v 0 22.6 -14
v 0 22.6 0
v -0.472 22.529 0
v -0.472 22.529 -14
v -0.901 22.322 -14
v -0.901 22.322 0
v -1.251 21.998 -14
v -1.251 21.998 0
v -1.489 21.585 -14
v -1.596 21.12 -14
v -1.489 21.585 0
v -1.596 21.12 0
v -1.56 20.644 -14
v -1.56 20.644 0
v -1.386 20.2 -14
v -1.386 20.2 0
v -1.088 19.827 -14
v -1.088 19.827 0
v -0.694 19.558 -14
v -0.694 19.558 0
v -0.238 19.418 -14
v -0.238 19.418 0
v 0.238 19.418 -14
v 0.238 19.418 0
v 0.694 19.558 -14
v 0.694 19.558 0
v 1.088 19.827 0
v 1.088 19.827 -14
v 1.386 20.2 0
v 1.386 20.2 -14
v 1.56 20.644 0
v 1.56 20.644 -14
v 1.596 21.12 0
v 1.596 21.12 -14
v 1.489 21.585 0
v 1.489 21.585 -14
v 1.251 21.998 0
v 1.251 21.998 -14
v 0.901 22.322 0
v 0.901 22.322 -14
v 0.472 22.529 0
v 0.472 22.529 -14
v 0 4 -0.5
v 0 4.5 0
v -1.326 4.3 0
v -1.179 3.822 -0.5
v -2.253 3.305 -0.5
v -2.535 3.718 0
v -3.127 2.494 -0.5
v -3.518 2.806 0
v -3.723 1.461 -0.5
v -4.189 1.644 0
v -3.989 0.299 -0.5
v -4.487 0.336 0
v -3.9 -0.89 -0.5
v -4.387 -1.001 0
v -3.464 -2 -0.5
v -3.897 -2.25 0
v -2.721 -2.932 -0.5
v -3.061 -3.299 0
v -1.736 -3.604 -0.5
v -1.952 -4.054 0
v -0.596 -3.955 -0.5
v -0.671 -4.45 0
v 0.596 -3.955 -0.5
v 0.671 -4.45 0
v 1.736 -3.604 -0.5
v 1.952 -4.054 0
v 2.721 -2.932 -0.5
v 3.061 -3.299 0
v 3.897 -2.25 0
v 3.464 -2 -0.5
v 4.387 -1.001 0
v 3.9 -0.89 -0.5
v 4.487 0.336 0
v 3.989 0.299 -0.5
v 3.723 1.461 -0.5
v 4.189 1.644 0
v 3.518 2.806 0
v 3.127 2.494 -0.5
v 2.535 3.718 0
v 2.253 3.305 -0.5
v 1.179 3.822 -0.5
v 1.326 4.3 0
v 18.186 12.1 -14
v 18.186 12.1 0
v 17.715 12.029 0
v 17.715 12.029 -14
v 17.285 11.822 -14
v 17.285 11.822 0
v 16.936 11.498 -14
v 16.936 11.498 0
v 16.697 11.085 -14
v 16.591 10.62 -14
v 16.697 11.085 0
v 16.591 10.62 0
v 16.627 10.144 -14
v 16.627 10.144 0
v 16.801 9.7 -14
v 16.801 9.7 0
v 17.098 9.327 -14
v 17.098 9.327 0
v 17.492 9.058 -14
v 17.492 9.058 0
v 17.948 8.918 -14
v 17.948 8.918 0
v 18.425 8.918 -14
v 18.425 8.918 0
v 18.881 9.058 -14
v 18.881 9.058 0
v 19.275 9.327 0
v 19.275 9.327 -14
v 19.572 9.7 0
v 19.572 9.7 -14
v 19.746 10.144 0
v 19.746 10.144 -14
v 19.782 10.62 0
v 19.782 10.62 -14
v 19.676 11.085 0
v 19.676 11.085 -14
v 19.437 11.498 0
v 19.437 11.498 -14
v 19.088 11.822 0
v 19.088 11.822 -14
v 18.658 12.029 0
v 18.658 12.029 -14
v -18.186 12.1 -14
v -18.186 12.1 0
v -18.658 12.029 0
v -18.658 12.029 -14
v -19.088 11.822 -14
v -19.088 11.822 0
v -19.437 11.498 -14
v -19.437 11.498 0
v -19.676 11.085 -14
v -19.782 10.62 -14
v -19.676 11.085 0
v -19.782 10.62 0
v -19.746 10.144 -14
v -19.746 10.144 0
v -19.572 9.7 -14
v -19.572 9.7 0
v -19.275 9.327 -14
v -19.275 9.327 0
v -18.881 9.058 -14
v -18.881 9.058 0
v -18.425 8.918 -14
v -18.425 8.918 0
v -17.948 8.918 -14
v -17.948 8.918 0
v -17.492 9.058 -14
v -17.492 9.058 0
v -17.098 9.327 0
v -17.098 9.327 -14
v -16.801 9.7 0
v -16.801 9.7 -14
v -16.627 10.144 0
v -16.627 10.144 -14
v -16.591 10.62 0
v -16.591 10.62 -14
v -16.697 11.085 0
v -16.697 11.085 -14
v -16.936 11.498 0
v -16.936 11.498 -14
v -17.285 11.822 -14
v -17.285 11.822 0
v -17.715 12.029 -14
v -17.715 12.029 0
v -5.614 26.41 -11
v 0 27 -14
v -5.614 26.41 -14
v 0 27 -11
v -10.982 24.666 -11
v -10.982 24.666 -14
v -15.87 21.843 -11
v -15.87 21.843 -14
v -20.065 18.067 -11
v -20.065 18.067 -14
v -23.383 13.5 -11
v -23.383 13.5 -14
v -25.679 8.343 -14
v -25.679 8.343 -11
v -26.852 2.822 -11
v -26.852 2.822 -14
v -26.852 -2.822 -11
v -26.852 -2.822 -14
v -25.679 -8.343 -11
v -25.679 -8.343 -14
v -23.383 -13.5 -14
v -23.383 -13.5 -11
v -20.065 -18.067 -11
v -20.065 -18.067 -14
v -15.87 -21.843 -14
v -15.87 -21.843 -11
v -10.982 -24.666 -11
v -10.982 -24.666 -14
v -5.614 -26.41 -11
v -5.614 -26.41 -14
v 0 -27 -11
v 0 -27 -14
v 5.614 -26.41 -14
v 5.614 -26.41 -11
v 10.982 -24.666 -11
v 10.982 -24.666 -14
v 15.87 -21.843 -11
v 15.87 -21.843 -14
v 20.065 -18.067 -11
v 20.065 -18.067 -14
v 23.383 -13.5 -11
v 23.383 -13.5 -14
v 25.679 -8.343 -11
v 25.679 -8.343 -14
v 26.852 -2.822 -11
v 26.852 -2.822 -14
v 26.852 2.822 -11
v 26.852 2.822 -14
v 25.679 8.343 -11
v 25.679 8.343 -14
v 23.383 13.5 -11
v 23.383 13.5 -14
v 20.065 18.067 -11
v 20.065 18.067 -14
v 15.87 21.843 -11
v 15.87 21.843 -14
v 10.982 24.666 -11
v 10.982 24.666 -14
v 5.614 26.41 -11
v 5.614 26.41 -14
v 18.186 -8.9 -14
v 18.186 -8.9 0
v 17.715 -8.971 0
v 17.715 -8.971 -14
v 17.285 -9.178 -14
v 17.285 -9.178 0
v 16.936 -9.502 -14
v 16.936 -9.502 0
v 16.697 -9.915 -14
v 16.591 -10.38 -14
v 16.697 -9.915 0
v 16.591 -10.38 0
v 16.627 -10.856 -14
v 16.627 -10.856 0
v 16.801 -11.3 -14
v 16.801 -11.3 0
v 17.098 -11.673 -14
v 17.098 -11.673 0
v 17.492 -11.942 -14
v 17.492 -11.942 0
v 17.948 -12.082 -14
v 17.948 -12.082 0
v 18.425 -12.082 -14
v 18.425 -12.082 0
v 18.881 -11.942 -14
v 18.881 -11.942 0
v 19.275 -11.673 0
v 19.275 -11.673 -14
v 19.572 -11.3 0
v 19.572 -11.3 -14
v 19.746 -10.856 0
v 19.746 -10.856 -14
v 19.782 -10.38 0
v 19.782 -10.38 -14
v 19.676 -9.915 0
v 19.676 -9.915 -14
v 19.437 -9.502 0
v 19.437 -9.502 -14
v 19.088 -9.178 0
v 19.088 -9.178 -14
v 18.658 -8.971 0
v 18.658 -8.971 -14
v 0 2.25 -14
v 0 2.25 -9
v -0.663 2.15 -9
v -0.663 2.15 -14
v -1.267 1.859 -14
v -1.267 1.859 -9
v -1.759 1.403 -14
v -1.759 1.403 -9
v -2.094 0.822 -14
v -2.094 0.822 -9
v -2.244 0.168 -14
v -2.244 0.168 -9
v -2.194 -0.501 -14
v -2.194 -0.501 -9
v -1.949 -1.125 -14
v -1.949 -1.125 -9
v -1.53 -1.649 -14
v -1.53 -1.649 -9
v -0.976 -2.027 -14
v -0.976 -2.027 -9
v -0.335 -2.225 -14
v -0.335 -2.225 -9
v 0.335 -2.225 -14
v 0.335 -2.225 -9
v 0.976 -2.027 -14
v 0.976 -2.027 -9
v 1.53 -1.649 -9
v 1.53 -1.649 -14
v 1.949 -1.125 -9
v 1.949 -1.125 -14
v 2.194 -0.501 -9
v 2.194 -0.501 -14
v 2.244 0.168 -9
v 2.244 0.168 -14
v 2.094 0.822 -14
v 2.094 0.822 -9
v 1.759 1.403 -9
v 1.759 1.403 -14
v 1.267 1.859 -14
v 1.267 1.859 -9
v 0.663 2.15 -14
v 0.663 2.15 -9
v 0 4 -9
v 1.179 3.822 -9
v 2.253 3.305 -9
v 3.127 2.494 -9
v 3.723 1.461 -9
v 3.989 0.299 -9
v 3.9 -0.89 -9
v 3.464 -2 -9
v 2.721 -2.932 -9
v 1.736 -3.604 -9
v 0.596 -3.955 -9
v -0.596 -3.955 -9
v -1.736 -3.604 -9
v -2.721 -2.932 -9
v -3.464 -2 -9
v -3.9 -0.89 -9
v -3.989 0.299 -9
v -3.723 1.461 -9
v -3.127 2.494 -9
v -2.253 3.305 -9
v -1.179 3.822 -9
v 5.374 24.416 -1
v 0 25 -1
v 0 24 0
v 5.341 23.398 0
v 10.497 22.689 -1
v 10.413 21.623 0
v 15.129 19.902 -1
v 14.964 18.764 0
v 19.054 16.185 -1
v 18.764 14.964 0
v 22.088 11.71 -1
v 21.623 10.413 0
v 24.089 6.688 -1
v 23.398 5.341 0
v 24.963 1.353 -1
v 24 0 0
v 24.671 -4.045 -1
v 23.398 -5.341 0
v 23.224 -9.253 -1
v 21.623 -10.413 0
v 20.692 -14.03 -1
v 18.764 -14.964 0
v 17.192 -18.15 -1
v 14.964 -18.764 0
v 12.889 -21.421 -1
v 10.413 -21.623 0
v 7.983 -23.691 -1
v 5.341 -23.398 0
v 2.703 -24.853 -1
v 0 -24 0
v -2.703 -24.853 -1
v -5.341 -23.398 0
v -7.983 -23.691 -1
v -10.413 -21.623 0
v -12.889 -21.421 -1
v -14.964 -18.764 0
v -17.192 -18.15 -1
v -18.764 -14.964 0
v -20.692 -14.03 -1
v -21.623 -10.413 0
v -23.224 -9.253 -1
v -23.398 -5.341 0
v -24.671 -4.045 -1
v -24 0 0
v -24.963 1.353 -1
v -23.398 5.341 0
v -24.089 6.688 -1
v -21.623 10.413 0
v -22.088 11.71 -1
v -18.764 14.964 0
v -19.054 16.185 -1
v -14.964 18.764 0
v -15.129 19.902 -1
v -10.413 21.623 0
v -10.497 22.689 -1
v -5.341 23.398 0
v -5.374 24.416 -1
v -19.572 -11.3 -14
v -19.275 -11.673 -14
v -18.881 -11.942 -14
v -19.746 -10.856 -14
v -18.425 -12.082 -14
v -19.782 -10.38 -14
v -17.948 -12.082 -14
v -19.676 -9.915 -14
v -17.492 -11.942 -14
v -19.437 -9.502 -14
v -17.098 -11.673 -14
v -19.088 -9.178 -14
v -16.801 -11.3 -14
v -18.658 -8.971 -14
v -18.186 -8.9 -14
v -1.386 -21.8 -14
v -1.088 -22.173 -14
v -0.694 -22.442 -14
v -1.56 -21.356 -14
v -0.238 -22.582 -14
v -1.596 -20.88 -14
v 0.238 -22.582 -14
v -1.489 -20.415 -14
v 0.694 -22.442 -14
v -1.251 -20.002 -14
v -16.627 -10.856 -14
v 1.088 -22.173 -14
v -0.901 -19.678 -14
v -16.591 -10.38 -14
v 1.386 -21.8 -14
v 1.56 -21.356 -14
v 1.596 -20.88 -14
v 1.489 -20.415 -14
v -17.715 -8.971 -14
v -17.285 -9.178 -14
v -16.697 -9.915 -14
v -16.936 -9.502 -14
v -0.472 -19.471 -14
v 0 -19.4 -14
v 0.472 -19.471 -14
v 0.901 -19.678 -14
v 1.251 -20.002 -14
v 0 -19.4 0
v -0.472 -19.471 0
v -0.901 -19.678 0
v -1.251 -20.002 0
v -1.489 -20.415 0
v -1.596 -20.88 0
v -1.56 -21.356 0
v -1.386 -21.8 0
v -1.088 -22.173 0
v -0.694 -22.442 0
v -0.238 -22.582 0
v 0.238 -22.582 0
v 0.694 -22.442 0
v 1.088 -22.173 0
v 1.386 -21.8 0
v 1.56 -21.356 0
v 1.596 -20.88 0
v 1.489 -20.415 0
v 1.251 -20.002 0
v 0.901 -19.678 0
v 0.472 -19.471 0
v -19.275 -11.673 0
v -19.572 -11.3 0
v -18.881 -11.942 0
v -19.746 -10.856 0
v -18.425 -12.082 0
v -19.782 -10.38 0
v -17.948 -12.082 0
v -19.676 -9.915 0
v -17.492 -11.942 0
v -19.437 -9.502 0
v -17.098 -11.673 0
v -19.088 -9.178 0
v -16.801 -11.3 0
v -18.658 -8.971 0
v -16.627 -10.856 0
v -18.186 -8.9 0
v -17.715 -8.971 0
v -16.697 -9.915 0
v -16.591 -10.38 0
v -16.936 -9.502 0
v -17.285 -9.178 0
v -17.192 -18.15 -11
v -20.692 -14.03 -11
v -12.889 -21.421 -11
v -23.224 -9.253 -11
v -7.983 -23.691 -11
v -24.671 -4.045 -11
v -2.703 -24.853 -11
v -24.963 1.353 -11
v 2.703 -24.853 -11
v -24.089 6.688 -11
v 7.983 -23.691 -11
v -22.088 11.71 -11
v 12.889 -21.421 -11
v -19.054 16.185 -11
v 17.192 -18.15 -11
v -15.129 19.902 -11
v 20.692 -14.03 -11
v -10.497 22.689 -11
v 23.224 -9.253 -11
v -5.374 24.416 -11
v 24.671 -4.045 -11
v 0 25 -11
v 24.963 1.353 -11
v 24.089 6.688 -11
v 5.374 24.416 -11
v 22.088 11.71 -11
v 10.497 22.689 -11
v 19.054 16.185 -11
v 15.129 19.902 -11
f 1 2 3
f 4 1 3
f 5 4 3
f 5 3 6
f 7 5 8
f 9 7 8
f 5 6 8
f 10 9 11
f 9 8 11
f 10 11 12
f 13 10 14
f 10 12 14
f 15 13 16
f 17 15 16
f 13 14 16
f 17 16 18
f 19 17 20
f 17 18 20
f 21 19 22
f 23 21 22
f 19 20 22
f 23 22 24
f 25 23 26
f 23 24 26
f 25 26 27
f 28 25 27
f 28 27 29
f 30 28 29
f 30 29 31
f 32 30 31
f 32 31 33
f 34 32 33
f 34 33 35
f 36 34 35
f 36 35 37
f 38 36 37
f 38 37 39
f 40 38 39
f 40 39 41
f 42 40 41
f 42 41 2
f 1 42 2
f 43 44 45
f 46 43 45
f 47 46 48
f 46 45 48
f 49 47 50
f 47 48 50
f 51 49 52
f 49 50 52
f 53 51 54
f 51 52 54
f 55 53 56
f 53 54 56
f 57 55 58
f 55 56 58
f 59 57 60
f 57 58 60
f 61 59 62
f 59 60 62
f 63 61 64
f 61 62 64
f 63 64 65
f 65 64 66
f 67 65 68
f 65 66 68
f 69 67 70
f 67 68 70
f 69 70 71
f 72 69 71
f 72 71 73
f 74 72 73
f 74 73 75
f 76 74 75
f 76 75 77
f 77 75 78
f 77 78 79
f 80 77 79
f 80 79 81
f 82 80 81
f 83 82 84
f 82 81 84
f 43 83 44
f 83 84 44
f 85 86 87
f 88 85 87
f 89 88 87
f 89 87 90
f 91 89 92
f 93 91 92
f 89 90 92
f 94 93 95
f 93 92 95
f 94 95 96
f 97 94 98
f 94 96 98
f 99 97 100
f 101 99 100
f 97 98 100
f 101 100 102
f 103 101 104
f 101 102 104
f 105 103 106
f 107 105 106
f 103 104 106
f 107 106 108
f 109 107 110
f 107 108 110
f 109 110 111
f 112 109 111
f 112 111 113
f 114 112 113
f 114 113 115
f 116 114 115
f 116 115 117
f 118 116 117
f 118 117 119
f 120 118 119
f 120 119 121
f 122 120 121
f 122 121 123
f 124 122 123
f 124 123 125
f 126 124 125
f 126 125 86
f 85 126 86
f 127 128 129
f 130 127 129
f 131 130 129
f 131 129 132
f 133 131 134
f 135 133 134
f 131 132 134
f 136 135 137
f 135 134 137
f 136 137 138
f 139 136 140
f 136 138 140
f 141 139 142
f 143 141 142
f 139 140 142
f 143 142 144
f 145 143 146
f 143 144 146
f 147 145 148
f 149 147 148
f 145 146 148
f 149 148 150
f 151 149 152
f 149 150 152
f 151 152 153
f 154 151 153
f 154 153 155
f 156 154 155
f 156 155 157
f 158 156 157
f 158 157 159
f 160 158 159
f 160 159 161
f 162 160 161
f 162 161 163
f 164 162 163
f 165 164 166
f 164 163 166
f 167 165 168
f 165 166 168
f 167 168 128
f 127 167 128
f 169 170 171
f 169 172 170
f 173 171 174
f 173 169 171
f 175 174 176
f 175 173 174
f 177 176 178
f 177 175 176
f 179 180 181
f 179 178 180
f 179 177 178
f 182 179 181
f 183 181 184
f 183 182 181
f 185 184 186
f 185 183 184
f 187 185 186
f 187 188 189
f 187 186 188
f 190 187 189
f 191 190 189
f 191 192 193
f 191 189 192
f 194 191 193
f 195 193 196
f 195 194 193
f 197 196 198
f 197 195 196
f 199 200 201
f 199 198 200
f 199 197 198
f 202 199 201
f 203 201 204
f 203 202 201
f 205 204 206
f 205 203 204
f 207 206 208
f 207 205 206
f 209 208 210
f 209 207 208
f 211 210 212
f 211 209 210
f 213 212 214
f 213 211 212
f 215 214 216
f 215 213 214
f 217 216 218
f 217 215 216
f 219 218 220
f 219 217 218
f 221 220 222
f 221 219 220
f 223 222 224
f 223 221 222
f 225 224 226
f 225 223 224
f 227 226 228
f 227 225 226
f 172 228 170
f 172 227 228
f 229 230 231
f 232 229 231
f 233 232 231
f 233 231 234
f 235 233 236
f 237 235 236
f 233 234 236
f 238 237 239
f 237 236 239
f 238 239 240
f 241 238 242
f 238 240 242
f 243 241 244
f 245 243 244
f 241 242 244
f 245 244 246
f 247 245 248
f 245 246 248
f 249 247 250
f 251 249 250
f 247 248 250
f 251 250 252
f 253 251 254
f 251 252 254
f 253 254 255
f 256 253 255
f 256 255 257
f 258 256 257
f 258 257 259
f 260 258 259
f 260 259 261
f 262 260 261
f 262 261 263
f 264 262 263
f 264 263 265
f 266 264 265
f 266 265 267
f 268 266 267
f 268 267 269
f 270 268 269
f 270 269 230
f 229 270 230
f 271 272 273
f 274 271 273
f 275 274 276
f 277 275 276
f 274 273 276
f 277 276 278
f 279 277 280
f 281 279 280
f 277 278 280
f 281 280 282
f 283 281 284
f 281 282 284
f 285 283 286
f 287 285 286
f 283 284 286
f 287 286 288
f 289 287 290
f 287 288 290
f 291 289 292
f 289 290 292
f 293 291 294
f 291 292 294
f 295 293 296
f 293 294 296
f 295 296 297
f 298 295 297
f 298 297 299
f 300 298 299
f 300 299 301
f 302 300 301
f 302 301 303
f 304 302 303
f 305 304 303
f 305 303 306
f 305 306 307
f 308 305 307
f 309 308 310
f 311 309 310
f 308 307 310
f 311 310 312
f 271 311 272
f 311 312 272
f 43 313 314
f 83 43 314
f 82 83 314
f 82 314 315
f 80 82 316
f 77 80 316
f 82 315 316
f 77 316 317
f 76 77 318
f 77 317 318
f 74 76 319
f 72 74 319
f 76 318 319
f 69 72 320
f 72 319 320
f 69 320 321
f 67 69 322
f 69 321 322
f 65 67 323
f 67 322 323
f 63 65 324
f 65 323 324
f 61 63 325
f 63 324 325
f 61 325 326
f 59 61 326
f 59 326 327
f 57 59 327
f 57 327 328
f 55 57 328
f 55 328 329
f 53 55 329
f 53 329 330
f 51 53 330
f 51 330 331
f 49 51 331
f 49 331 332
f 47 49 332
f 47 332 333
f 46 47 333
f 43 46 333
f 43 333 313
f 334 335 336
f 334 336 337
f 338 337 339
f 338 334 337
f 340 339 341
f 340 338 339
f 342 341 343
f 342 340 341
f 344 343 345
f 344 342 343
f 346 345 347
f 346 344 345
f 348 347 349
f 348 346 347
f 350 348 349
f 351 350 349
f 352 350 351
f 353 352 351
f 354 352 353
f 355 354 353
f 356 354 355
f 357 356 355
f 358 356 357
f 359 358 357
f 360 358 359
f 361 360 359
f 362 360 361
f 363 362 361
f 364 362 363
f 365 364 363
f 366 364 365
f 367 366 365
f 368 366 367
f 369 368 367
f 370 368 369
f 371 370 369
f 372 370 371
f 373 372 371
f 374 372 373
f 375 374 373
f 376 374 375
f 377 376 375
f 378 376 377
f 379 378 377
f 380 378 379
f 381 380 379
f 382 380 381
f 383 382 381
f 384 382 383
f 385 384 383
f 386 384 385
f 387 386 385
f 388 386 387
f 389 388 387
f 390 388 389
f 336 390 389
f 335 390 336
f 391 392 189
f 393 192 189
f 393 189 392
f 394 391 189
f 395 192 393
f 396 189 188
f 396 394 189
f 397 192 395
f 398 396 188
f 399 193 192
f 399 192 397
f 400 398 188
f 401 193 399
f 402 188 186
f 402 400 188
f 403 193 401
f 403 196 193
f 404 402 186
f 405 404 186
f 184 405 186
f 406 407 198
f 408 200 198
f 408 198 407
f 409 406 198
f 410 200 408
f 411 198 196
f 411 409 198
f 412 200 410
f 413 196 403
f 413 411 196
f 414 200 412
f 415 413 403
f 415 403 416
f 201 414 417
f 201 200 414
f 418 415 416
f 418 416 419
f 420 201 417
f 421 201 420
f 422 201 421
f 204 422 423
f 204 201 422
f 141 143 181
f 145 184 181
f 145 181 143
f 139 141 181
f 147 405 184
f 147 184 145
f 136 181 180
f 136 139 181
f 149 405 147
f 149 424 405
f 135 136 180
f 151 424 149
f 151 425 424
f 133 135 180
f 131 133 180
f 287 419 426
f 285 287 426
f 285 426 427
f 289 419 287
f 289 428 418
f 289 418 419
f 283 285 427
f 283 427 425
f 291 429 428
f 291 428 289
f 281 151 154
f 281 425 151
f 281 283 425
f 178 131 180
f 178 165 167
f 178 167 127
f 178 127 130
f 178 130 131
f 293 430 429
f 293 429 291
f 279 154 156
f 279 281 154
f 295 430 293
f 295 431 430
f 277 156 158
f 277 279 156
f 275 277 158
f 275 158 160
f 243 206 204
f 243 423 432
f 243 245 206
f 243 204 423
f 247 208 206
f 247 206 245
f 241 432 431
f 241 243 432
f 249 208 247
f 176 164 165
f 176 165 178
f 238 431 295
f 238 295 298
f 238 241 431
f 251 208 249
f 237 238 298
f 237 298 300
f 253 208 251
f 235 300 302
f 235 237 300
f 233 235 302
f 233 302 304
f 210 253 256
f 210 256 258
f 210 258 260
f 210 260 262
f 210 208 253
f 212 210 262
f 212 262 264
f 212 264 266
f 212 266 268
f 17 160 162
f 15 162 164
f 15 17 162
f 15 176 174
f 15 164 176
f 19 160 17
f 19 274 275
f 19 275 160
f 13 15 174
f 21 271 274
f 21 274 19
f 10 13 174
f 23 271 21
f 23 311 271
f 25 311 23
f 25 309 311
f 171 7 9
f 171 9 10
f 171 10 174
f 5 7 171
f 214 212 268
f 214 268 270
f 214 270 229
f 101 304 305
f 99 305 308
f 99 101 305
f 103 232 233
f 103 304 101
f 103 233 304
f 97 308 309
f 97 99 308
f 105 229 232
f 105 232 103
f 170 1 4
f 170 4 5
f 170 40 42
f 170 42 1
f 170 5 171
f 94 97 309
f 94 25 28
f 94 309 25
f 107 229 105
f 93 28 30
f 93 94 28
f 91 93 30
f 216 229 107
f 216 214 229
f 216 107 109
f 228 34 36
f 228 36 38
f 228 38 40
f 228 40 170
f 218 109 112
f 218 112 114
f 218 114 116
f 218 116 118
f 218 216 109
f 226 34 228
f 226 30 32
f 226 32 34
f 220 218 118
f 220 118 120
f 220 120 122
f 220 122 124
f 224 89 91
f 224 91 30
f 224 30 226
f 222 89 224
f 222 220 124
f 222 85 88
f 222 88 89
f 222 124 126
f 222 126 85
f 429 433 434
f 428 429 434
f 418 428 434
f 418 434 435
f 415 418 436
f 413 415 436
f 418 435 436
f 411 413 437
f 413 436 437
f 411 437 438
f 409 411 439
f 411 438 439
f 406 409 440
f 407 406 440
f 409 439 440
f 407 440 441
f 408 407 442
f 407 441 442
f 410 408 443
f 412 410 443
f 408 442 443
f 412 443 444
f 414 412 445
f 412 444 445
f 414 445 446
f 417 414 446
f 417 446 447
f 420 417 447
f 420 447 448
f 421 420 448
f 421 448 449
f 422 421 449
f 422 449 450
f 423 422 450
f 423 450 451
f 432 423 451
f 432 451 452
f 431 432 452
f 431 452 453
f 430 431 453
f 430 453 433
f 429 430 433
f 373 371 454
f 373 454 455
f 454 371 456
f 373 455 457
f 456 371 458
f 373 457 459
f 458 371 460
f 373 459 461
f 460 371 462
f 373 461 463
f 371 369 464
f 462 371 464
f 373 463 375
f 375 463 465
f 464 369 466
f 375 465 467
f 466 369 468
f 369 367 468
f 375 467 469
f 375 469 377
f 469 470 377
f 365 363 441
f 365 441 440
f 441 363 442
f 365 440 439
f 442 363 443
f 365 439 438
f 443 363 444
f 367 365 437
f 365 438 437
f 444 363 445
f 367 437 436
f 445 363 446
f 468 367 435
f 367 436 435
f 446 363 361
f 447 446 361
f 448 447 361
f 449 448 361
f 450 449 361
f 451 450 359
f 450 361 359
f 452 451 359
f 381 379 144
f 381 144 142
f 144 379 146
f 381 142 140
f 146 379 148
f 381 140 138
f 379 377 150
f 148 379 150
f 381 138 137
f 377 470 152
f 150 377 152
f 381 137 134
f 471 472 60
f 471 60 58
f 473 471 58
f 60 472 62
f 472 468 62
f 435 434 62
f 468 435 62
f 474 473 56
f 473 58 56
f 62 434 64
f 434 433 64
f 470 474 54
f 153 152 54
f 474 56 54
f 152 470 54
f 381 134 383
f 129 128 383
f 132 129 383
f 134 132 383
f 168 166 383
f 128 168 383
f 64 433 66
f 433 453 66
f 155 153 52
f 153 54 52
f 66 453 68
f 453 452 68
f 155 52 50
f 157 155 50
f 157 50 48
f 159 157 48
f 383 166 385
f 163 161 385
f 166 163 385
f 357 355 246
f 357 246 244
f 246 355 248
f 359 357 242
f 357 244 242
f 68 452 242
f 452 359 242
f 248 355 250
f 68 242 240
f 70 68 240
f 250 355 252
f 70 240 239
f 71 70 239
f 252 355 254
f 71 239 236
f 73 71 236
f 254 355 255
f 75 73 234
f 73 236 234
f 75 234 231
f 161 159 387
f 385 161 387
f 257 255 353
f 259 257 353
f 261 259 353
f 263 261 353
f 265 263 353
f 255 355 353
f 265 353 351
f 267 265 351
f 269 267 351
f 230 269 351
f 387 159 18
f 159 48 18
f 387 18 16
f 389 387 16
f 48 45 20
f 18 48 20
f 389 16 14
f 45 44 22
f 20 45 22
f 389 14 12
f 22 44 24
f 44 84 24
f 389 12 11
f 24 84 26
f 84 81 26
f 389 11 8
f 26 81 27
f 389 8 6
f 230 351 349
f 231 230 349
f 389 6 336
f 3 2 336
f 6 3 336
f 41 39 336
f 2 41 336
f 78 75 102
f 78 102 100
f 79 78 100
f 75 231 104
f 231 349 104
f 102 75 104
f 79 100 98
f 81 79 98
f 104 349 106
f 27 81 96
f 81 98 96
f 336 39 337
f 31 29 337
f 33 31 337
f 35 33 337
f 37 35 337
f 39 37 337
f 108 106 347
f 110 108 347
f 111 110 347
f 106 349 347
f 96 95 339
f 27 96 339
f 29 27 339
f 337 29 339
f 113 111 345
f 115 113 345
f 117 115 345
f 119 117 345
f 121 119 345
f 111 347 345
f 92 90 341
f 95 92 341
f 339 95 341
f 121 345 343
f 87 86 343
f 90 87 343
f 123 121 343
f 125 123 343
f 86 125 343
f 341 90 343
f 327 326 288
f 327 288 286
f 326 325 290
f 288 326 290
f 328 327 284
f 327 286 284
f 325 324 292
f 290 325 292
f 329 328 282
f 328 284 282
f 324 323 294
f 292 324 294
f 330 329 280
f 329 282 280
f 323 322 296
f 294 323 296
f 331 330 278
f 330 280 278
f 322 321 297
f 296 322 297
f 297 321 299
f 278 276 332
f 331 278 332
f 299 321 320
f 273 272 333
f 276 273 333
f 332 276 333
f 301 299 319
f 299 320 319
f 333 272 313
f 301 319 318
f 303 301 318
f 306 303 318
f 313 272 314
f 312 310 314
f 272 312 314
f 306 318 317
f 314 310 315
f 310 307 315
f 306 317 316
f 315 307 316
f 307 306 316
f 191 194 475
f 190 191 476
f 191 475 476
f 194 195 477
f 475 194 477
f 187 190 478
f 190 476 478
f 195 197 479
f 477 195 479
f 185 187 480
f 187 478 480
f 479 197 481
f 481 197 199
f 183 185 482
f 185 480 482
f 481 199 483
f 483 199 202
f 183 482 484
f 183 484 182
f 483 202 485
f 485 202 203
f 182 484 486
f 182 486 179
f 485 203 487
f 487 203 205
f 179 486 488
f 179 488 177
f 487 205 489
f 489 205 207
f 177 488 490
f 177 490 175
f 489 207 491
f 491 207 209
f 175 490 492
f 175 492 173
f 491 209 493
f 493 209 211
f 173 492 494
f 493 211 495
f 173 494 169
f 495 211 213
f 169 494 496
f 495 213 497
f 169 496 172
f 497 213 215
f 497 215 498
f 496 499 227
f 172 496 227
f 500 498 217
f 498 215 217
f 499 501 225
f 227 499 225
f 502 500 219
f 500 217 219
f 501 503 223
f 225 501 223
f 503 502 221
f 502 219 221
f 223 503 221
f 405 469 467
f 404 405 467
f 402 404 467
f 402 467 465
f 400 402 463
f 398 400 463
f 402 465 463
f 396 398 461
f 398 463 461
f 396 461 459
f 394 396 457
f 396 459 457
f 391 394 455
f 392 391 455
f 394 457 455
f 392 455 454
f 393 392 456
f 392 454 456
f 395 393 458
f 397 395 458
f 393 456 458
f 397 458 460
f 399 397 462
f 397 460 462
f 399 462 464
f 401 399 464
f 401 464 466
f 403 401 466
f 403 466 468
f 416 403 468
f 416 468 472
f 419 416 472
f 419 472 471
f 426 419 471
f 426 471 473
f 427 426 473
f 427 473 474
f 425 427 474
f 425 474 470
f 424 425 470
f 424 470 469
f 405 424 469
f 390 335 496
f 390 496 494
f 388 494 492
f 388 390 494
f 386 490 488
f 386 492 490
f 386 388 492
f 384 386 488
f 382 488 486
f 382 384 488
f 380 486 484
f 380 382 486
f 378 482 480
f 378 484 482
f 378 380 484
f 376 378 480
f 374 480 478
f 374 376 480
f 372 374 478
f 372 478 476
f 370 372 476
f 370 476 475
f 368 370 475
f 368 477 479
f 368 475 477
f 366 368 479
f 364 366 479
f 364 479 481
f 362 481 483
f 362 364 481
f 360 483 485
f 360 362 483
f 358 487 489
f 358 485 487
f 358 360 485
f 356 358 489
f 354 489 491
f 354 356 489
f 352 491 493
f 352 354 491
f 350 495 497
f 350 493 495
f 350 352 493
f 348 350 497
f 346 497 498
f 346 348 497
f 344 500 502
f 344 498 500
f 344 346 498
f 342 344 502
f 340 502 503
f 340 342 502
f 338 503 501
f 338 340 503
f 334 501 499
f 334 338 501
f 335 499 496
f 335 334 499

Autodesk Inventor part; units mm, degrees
ref_plane "YZ Plane" through (0, 0, 0) normal (1, 0, 0) x (0, 1, 0)
ref_plane "XZ Plane" through (0, 0, 0) normal (0, 1, 0) x (-1, 0, 0)
ref_plane "XY Plane" through (0, 0, 0) normal (0, 0, 1) x (1, 0, 0)
sketch "スケッチ1" plane through (0, 0, 0) normal (1, 0, 0) x (0, 1, 0)
  line L0 (7, 0) -> (7, 0)
  line L1 (0, -9) -> (0, -14)
  line L2 (0, -14) -> (27, -14)
  line L3 (27, -14) -> (27, -11)
  line L4 (27, -11) -> (25, -11)
  line L5 (25, -11) -> (25, 0)
  line L6 (25, 0) -> (7, 0)
  line L7 (7, 0) -> (4, 0)
  line L8 (4, 0) -> (4, -9)
  line L9 (4, -9) -> (0, -9)
  point P0 (0, 0)
  dimension "d2" = 11
  dimension "d3" = 3
  dimension "d4" = 25
  dimension "d5" = 2
  dimension "d35" = 0
  dimension "d36" = 7
  dimension "d37" = 4
  dimension "d45" = 9
revolve "回転1" add sketch "スケッチ1" angle 360 about axis through (0, 0, -9) along (0, 0, -1)
chamfer "面取り1" distance 1 angle 45 1 edges at (0, -25, 0)
sketch "スケッチ2" plane through (0, 0, -14) normal (0, 0, -1) x (-1, 0, 0)
  point P0 (0, 0)
hole "穴1" at (0, 0, -14) direction (0, 0, 1) diameter 4.5 end through all clearance for "Socket Head Cap Screw" size "M4" standard "Ansi Metric M Profile"
sketch "スケッチ3" plane through (0, 0, -14) normal (0, 0, -1) x (-1, 0, 0)
  circle A0 centre (0, 0) radius 21
  point P0 (0, 0)
  point P1 (0, -21)
  point P2 (18.1865, -10.5)
  point P3 (18.1865, 10.5)
  point P4 (0, 21)
  point P5 (-18.1865, 10.5)
  point P6 (-18.1865, -10.5)
  dimension "d20" = 42
  dimension "d23" = 360
hole "穴2" at (0, -21, -14) at (-18.1865, -10.5, -14) at (-18.1865, 10.5, -14) at (0, 21, -14) at (18.1865, 10.5, -14) at (18.1865, -10.5, -14) direction (0, 0, 1) diameter 3.2 end through all clearance for "Socket Head Cap Screw" size "M3" standard "Ansi Metric M Profile"
chamfer "面取り4" distance 0.5 angle 45 1 edges at (0, -4, 0)
properties part number "base3" material "ABS プラスチック"
